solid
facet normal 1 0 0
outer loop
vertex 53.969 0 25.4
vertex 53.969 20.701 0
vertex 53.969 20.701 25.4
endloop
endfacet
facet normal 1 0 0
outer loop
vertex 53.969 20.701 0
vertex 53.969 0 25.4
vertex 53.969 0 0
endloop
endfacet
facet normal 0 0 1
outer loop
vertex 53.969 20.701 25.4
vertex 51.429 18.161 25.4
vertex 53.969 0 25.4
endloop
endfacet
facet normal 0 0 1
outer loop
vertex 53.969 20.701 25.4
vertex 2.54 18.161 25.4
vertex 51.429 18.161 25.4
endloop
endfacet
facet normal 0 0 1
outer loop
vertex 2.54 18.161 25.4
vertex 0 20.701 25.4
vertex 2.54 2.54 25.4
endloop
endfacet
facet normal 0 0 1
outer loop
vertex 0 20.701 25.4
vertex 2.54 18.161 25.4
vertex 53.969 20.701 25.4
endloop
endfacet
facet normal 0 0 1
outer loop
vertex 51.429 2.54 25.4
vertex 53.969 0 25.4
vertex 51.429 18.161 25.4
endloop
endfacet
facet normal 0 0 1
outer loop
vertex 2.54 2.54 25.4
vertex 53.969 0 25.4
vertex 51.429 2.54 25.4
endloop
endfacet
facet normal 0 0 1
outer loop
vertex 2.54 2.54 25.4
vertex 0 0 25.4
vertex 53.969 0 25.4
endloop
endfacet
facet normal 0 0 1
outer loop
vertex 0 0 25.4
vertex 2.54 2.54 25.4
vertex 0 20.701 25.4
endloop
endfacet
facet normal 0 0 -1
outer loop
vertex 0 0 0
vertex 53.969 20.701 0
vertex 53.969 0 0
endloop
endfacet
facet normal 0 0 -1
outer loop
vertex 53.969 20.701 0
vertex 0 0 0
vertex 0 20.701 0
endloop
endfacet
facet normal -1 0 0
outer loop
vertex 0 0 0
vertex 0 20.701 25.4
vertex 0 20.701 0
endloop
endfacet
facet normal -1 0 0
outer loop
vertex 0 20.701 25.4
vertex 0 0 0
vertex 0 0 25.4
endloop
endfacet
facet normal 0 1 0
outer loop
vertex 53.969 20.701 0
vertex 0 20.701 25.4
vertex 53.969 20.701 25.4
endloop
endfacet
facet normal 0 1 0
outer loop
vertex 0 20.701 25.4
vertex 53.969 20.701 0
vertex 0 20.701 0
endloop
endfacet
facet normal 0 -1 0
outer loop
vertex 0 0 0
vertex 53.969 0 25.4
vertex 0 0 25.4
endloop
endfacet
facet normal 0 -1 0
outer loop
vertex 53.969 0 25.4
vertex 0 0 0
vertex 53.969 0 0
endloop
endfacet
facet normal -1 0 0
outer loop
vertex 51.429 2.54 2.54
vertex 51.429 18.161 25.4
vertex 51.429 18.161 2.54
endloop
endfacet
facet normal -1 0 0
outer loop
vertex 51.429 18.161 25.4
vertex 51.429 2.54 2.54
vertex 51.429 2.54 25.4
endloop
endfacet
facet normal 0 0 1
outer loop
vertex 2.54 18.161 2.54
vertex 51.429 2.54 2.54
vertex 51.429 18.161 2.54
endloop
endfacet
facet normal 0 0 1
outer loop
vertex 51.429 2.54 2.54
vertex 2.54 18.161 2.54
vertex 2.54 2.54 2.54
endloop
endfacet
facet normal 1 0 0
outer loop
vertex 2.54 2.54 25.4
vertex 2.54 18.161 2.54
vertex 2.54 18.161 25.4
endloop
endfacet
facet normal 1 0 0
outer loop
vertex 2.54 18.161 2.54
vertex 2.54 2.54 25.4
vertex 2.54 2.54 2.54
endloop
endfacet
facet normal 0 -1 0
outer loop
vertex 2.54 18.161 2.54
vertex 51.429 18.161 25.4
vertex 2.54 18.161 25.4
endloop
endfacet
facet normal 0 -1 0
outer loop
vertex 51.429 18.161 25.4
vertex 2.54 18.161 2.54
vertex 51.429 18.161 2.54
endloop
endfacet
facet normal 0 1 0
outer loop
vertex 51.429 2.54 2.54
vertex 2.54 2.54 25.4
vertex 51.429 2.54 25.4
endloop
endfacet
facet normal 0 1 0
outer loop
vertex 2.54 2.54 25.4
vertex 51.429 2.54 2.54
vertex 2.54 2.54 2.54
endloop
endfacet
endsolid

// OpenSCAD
/* [Model Resolution (All dimensions are in Millimeters)] */
$fn = 256;

/* [Box Container Properties(Inside Diameter)] */

Length = 48.00;
Width = 14.732;
Fit = .889; //.889(.035") is a good fit for most 
Height = 25.4;
Wall_Thickness = 2.54;
Floor_Thickness = 2.54;

/* [Screw Hole Properties] */
Screw_Holes_On = false;
Screw_Hole_Diameter = 5.08;
Amount_Of_Screw_Holes = 2;
Chamfer_Adjust = 3.5;


difference()
{   
    // Outside Dimensions
    cube([ 
        Length+Fit+(Wall_Thickness * 2), 
        Width+Fit+(Wall_Thickness * 2), 
        Height ],
         center = false);
    // Inside Dimensions
    translate([ 
        Wall_Thickness, 
        Wall_Thickness, 
        Floor_Thickness])
        cube([ Length+Fit, Width+Fit, Height], center = false);
    if(Screw_Holes_On==true){
        // Screw Hole
        for (x = [1:Amount_Of_Screw_Holes])
            screwHoleBox(x,
                        Width+Fit,
                        Length+Fit,
                        Screw_Hole_Diameter,
                        Wall_Thickness,
                        Floor_Thickness,
                        Amount_Of_Screw_Holes);
        // Chamfer
        for(x=[1:Amount_Of_Screw_Holes])
        chamferHoleBox(
        x,
        Width+Fit,
        Length+Fit,
        Screw_Hole_Diameter,
        Wall_Thickness,
        Floor_Thickness,
        Amount_Of_Screw_Holes,
        Chamfer_Adjust);
    }
    
};

// Screw Hole
module
screwHoleBox(xPos,
             width,
             length,
             screwHoleDiameter,
             wallThickness,
             floorThickness,
             screwHoleAmount)
{
    translate([
        wallThickness +
           round(xPos*(length / (screwHoleAmount+1))),
        wallThickness + (width / 2),
        -floorThickness
    ]) cylinder(
        h = floorThickness+30, 
        d = screwHoleDiameter, 
        center = false);
}

module
chamferHoleBox(xPos,
               width,
               length,
               screwHoleDiameter,
               wallThickness,
               floorThickness,
               screwHoleAmount,
               chamferAdjust)
{
    translate([
        wallThickness + 
        round(xPos * (length / (screwHoleAmount+1))),
        wallThickness + (width / 2),
        floorThickness -
        chamferAdjust
    ]) cylinder(
        h = screwHoleDiameter, 
        d1 = screwHoleDiameter, 
        d2 = screwHoleDiameter*2, 
        center = false
        );
}
